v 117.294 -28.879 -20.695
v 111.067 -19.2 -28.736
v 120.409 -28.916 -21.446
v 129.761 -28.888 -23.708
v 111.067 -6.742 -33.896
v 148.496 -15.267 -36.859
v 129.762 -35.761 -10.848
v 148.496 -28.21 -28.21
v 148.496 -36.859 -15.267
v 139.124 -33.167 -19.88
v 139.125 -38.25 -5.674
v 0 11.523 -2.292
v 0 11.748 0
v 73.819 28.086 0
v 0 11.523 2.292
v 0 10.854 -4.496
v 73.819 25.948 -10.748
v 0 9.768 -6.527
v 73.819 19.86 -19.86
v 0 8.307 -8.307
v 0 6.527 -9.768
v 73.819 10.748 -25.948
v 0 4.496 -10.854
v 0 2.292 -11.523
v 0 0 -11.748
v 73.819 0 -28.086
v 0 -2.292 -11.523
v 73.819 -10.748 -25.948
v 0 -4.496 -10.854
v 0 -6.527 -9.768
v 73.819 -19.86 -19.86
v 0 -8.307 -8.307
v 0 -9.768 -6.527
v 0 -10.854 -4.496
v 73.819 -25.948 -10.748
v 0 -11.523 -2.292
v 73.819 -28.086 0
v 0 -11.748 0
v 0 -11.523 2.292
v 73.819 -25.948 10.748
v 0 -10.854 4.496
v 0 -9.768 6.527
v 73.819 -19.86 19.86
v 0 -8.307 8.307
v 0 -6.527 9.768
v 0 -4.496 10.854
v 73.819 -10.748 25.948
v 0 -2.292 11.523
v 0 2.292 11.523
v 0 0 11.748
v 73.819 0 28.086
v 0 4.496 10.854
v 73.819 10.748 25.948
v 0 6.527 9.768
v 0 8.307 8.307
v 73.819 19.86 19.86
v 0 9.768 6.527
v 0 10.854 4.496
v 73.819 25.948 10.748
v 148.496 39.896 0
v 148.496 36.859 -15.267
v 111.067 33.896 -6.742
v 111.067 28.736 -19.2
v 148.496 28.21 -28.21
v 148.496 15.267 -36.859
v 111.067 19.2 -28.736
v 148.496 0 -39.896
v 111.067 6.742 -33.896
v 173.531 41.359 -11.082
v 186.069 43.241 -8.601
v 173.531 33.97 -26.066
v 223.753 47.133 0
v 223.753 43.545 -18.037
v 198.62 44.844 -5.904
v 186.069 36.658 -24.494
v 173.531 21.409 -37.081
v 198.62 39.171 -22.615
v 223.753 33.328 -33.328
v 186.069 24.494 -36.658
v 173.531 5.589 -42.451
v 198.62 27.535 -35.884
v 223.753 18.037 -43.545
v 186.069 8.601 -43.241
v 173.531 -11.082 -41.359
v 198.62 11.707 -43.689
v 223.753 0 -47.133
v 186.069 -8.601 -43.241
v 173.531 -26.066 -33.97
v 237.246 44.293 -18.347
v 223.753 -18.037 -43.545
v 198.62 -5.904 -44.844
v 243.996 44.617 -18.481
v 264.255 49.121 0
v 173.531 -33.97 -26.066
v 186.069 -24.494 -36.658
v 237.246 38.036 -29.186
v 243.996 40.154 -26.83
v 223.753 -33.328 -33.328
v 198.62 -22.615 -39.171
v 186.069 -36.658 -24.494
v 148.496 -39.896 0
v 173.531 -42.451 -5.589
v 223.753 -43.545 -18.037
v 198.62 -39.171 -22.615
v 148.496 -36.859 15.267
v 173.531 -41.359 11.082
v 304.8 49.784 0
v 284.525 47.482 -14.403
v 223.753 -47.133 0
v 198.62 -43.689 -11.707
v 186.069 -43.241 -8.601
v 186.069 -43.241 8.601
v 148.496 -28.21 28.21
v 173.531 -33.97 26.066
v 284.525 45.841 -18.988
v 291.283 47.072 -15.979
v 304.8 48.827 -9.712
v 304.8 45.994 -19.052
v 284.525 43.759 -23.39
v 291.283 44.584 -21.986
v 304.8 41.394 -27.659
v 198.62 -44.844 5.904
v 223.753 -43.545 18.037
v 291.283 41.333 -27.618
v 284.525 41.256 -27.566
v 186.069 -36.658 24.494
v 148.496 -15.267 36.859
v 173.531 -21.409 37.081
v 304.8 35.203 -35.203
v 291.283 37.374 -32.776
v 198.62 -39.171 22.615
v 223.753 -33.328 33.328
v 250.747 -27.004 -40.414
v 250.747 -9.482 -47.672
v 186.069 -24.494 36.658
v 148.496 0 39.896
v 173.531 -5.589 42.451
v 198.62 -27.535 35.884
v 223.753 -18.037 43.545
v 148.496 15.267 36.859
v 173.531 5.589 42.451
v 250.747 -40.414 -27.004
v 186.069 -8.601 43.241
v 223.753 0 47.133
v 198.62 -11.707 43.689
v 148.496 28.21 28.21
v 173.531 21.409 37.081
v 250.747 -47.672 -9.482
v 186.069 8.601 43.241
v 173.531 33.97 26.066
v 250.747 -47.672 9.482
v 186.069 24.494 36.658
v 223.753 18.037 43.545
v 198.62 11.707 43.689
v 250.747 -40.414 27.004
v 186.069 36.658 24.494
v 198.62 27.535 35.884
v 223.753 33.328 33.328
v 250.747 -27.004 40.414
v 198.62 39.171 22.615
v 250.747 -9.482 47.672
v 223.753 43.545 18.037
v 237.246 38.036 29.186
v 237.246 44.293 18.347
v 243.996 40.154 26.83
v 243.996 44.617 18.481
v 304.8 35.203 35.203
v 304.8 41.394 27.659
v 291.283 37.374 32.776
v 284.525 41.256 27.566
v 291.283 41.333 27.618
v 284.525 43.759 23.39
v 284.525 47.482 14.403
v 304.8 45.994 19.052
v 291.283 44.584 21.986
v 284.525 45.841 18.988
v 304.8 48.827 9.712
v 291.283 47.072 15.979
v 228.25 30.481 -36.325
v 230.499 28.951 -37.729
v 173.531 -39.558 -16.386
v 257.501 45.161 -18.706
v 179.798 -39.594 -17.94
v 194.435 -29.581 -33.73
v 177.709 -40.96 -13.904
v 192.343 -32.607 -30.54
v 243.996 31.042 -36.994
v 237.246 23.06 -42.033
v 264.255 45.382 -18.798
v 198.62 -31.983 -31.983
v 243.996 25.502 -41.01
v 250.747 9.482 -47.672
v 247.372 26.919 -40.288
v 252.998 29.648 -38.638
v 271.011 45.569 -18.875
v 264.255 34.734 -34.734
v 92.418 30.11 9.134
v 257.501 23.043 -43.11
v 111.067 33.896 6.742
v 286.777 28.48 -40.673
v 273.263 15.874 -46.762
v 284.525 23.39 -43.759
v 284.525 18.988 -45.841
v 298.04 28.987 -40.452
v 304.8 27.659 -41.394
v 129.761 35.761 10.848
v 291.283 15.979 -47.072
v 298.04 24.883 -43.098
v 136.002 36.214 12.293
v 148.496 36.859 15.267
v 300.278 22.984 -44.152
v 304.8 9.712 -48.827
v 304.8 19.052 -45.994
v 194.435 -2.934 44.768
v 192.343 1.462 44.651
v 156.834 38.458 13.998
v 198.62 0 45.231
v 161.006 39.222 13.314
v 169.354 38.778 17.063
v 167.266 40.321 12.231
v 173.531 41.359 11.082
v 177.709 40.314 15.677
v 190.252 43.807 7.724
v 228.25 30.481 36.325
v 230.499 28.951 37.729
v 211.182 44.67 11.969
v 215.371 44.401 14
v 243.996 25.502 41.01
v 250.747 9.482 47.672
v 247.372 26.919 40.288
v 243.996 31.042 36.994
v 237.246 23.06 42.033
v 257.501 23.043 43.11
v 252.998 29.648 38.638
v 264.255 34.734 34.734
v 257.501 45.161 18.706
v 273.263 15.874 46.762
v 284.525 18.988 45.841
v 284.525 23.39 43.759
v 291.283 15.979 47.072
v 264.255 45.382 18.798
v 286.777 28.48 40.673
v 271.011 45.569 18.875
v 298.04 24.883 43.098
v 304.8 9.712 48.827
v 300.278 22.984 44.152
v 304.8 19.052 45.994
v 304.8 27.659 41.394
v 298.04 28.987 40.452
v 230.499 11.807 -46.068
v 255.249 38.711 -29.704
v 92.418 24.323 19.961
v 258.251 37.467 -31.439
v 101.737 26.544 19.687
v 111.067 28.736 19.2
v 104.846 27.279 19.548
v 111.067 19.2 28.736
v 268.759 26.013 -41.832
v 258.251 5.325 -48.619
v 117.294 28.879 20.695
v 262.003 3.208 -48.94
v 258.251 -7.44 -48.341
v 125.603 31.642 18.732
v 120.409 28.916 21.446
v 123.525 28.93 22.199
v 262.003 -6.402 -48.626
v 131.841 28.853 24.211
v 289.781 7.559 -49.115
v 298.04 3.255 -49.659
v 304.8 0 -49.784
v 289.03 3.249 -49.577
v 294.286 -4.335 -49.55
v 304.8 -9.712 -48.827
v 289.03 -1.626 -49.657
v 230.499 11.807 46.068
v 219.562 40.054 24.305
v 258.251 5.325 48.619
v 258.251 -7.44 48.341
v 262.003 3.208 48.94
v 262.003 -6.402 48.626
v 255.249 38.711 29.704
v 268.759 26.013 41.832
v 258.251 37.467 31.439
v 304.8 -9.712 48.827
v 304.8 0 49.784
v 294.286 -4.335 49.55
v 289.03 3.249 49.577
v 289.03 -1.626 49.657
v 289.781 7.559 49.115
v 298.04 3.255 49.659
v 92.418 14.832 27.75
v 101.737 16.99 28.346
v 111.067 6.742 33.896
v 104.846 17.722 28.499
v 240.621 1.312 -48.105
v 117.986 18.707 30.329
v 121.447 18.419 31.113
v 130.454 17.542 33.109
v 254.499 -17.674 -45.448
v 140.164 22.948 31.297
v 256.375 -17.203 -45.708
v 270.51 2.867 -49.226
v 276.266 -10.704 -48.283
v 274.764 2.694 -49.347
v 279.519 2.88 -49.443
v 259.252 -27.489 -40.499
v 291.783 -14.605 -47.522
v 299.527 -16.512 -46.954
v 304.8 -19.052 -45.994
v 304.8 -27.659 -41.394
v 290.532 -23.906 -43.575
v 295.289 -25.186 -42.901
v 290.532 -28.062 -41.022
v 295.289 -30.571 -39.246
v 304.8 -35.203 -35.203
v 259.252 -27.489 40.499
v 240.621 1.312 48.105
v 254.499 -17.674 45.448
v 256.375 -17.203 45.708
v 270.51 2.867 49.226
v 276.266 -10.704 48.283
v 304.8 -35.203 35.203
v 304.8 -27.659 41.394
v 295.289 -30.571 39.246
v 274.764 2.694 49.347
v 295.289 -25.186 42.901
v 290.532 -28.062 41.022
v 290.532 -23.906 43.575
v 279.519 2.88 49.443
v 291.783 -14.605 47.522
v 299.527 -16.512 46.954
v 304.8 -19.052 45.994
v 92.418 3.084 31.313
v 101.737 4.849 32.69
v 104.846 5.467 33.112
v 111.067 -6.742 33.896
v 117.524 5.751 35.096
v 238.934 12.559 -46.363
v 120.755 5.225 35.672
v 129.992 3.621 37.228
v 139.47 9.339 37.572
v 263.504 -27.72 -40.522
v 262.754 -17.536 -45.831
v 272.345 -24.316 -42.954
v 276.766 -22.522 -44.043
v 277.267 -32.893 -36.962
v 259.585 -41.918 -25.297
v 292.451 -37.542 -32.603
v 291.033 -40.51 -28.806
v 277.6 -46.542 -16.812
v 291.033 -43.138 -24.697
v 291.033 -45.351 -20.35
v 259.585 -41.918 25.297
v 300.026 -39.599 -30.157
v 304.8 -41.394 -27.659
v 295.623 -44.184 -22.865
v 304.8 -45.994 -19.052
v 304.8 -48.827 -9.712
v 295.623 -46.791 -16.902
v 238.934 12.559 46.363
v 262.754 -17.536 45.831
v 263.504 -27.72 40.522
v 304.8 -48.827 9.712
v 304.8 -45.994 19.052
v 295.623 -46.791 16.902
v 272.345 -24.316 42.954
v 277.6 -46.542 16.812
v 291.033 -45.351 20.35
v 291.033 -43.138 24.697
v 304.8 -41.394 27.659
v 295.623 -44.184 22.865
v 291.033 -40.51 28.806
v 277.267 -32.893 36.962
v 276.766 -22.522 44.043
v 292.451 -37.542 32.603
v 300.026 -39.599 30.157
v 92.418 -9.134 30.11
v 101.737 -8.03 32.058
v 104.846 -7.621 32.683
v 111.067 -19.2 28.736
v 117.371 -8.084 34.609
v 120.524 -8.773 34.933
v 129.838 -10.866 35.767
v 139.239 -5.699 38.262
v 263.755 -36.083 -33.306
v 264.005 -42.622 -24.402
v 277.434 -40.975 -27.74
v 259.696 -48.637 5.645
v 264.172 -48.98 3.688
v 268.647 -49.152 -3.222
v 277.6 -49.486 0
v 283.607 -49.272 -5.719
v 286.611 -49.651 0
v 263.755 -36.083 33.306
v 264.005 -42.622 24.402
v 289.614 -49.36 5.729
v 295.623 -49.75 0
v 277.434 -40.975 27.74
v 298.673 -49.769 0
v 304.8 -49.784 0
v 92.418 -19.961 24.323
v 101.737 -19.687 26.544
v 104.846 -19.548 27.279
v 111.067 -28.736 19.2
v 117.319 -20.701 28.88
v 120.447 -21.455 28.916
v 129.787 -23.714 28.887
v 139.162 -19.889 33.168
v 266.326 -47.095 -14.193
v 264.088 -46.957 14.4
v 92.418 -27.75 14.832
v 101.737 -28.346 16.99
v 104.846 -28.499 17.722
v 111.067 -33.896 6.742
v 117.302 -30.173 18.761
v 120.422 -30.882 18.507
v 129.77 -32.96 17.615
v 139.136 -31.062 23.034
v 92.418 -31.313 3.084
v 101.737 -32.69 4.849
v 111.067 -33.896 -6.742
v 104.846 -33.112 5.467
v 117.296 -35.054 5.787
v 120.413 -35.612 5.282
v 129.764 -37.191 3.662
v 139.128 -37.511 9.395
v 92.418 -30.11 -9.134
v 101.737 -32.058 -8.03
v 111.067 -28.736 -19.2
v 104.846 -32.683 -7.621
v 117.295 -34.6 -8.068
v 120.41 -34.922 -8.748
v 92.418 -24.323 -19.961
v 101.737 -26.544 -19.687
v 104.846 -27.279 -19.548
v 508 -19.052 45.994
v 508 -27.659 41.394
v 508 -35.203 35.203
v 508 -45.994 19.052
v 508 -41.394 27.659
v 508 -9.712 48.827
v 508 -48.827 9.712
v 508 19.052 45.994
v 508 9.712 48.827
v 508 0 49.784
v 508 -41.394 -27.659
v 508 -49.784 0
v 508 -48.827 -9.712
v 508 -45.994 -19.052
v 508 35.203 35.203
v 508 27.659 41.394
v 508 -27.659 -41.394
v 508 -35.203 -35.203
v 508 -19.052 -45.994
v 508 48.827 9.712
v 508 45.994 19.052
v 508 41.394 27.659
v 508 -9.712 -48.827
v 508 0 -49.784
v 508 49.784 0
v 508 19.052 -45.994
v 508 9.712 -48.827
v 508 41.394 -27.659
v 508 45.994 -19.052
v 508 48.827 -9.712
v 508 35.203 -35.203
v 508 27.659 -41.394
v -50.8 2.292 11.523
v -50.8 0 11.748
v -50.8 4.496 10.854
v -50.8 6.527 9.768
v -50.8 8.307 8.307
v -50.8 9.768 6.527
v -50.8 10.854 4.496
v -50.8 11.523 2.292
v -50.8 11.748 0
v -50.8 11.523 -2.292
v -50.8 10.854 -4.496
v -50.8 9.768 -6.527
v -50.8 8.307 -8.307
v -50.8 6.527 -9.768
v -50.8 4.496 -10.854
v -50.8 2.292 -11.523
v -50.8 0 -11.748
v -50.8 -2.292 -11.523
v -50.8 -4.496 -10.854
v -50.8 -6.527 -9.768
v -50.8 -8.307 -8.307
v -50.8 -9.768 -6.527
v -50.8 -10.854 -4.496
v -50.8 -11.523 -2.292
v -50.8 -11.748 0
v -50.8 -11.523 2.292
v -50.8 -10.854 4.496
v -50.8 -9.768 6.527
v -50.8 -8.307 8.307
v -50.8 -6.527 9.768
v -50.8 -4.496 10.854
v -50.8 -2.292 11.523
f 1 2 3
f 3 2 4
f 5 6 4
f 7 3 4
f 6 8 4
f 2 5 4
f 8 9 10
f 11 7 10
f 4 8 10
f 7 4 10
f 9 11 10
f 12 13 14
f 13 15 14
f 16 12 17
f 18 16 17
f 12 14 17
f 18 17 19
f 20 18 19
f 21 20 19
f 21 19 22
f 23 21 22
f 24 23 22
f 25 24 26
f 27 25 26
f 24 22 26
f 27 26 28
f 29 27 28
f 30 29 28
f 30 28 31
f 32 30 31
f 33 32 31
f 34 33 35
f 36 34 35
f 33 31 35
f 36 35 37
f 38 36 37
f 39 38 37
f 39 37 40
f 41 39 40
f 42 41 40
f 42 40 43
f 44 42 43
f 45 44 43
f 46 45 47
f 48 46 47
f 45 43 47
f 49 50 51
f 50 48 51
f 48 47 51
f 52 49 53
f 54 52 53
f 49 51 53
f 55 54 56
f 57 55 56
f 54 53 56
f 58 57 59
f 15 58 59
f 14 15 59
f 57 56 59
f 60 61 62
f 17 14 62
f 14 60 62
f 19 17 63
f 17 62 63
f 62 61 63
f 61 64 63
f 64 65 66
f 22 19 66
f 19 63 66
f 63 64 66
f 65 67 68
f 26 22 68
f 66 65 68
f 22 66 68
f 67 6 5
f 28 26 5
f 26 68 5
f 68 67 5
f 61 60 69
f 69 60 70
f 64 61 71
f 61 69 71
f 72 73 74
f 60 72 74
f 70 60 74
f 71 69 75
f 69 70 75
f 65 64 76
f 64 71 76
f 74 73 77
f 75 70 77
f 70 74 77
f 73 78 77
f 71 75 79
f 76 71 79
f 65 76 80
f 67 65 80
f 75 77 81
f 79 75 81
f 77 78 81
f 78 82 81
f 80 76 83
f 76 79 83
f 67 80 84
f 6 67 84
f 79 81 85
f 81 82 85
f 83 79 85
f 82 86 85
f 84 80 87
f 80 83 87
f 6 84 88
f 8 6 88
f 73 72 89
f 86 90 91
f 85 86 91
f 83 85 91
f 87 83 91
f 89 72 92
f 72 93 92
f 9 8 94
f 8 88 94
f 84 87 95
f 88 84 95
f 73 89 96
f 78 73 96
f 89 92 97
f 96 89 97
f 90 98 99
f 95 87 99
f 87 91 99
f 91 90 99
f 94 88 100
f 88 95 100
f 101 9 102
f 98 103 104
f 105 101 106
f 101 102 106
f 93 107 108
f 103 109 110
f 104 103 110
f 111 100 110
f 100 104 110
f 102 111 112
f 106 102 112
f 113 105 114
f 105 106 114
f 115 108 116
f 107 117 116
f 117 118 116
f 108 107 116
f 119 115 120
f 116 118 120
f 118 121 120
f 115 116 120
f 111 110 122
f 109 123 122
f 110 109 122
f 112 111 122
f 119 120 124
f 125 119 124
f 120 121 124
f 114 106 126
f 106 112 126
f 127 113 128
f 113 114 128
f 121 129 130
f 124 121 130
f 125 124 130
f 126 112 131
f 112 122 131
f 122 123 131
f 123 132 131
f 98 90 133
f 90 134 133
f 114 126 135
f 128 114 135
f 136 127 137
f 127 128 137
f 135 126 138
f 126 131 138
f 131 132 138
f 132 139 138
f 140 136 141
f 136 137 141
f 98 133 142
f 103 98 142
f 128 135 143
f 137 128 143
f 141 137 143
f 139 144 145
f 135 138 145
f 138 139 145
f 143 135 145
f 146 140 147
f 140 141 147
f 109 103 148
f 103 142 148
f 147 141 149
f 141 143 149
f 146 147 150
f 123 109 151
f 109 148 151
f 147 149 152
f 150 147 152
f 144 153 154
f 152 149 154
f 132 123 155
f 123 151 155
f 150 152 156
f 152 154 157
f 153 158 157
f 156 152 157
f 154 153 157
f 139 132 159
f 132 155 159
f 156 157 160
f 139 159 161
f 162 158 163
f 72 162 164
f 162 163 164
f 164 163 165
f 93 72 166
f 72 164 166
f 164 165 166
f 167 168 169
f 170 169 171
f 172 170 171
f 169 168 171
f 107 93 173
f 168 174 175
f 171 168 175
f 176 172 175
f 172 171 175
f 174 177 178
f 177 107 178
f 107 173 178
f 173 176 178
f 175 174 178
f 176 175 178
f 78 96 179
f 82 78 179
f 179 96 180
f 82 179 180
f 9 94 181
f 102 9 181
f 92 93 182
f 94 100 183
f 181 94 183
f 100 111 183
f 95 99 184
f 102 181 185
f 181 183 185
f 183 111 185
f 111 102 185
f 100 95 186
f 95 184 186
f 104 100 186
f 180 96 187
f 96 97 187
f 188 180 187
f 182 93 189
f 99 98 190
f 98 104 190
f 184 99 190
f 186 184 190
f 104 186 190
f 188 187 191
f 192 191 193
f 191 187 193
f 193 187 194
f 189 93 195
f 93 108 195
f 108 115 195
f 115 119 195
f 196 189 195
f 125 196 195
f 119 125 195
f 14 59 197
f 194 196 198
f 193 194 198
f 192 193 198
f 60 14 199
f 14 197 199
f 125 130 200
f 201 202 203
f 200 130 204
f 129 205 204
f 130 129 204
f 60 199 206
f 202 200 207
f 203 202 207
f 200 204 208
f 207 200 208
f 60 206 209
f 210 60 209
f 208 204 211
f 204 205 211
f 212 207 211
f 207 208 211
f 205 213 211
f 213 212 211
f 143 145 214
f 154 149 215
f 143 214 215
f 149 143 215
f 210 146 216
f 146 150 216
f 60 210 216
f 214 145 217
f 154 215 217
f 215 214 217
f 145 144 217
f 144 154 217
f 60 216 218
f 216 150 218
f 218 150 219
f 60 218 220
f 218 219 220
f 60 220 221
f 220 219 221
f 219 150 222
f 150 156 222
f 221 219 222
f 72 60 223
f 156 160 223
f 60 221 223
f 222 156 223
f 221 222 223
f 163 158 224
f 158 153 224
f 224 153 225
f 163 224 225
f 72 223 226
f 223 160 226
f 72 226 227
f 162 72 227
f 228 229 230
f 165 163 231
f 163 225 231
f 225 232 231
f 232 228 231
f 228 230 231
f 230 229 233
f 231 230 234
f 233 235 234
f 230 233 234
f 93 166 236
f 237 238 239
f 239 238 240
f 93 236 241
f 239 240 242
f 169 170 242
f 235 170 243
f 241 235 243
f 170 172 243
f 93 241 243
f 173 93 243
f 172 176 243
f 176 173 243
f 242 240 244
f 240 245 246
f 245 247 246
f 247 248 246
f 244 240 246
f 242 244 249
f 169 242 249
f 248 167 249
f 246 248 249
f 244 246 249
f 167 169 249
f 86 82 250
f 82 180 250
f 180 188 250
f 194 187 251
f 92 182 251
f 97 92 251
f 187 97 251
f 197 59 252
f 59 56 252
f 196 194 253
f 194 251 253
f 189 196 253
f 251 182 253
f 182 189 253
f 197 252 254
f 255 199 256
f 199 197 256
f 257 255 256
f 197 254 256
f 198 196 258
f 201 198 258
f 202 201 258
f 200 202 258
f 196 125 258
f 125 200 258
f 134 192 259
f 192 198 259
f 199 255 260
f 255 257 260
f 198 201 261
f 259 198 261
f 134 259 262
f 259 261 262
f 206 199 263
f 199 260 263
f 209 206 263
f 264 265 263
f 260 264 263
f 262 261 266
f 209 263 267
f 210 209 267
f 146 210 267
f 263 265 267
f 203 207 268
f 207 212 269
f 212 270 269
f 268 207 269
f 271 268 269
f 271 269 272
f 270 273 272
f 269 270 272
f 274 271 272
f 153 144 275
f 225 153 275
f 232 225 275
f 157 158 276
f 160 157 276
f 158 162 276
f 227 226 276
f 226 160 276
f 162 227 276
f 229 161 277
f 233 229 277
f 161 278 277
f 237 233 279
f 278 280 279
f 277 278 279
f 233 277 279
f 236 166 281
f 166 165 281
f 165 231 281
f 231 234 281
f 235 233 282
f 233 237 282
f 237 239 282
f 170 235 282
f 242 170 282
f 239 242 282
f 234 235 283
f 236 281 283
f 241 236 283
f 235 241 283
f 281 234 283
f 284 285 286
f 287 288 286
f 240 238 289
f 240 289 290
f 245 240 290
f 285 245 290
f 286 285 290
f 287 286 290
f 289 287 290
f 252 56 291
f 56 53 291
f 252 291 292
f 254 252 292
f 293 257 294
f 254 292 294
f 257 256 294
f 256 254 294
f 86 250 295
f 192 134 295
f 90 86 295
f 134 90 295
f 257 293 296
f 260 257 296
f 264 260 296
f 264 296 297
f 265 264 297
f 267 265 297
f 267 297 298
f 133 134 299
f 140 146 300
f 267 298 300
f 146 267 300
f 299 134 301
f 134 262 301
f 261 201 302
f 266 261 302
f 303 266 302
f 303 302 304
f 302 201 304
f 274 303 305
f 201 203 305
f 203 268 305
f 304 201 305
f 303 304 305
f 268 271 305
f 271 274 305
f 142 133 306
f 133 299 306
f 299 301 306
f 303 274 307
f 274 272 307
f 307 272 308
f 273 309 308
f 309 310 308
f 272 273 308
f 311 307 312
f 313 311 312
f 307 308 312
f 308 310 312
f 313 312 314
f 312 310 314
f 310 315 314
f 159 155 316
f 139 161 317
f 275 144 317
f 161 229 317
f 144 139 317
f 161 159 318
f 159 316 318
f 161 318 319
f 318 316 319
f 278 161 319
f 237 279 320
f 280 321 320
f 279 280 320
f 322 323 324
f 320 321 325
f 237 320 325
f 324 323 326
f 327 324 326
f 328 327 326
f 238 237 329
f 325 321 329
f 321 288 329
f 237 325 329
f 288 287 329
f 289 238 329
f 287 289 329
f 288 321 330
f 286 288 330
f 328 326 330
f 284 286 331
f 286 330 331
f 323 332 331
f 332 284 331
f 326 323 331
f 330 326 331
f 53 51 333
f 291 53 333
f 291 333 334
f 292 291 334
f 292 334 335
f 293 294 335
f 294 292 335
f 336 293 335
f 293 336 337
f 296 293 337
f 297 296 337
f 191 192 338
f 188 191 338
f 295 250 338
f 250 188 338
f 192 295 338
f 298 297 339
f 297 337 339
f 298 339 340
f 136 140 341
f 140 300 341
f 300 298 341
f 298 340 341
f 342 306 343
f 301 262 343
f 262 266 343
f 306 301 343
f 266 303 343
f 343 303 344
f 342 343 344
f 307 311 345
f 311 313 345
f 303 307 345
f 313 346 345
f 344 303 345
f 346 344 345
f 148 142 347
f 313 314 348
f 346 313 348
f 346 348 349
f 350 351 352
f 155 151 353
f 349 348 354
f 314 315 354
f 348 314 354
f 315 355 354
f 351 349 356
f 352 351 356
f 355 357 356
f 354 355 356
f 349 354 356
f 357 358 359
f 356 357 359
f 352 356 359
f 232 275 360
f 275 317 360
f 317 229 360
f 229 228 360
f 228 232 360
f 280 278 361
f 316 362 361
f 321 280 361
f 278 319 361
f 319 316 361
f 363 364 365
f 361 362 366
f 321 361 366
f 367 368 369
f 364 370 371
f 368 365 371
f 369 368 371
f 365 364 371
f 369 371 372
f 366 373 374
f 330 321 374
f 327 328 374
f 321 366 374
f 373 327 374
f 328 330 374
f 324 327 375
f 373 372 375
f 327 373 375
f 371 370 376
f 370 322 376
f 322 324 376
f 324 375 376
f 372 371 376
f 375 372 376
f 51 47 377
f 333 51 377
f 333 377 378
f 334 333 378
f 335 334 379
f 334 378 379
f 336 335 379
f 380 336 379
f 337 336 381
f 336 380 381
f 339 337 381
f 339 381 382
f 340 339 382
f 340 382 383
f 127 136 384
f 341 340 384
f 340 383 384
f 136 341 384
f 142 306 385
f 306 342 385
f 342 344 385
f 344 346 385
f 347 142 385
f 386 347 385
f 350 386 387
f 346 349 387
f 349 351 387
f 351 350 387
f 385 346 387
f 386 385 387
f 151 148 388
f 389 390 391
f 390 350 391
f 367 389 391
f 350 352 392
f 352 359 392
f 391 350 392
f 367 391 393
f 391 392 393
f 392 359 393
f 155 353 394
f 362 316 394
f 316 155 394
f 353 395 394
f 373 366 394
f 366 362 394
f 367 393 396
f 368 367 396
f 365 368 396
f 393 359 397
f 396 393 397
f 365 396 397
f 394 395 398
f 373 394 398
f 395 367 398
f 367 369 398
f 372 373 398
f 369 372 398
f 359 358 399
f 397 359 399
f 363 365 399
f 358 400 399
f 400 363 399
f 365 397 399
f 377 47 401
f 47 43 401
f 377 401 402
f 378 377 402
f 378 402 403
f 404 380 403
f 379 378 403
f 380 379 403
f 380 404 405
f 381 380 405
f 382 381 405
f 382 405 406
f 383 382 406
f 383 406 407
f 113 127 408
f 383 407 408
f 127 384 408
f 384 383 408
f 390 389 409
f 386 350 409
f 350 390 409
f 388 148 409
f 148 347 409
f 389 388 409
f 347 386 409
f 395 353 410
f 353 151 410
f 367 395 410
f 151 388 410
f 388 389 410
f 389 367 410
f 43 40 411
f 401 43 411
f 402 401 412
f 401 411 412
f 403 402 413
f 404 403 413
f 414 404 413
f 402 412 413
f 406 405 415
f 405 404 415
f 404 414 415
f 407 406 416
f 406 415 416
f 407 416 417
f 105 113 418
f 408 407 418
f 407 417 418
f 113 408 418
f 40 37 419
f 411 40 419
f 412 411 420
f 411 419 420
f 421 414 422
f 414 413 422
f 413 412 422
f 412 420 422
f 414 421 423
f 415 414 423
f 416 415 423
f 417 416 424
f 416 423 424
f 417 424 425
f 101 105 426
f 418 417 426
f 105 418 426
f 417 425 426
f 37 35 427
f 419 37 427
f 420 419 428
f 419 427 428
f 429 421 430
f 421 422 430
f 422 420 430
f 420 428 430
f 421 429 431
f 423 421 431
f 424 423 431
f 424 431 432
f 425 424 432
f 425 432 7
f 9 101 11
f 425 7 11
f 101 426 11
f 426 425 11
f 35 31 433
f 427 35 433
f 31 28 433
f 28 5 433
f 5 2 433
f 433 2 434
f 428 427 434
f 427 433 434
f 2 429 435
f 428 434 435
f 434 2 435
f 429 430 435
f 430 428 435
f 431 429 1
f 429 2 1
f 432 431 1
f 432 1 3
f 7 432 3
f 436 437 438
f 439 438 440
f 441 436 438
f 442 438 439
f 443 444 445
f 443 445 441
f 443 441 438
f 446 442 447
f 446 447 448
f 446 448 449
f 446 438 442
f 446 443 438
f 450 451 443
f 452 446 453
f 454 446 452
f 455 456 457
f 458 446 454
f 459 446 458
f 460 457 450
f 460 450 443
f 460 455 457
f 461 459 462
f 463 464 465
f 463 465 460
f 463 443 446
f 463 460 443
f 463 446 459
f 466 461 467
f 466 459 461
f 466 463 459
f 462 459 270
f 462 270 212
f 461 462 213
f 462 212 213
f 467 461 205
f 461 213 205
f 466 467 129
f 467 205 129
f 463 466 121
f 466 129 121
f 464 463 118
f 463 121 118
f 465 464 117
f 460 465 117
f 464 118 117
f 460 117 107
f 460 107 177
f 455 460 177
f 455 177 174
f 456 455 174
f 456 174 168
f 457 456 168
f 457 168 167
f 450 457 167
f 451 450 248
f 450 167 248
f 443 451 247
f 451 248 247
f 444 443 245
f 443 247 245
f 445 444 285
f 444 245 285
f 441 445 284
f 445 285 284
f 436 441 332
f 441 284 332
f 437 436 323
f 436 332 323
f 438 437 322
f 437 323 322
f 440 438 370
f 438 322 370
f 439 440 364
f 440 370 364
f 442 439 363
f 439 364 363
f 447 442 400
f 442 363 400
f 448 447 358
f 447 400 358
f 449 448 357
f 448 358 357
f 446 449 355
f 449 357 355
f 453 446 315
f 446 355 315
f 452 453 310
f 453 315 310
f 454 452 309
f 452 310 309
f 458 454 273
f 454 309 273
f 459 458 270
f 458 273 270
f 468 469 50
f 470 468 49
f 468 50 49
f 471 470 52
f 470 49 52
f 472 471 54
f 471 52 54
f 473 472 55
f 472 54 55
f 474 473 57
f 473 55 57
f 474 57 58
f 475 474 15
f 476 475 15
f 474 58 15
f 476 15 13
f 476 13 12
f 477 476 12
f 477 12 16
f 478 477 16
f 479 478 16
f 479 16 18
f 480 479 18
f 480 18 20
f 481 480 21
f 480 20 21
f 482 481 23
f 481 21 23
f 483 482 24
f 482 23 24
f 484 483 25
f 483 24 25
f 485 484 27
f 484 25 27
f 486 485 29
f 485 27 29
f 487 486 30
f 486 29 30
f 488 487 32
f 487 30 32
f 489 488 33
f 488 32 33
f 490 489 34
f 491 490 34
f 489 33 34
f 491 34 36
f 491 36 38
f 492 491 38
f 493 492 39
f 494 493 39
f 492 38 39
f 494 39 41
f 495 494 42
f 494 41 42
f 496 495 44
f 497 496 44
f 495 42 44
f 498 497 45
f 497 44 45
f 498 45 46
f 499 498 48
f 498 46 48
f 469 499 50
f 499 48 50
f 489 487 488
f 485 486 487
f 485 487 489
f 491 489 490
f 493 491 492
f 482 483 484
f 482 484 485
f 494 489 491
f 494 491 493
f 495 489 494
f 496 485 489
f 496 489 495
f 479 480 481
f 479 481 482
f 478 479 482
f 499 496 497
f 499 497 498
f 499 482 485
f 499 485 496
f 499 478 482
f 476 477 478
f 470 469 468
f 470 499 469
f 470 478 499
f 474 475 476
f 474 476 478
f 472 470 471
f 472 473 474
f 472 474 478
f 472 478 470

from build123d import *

# Parameters (mm, degrees)
SKETCH2_R           = 49.784
BOSS_EXTRUDE1_DEPTH = 203.2
SKETCH3_R           = 11.74839717
BOSS_EXTRUDE2_DEPTH = 50.8


with BuildPart() as part:
    # Sketch1 → Revolve1 (revolve)
    with BuildSketch(Plane.XY):
        with BuildLine():
            Line((304.8, 49.784), (304.8, 0))
            Line((304.8, 0), (0, 0))
            Line((0, 0), (0, 11.748397173))
            add(Edge.make_bspline(
                [(0, 11.748397173), (0.424160675, 11.855932678), (1.277768006, 12.07173392), (3.085410505, 12.527272667), (5.106222596, 13.032281093), (7.110128552, 13.529344024), (9.159948224, 14.034387922), (11.195444228, 14.532141119), (13.233412884, 15.026861964), (15.805049223, 15.64653599), (18.91026091, 16.387291474), (22.550652523, 17.244690048), (26.727238439, 18.213147263), (31.952168035, 19.405675489), (42.412897925, 21.742539102), (62.333903875, 25.976370199), (110.770450737, 35.225121195), (160.70732909, 42.159920913), (207.702302928, 46.434962608), (245.168015054, 48.368183749), (253.734807707, 48.740972714), (260.161369668, 48.98354131), (264.446272339, 49.130442523), (268.731666265, 49.262530797), (273.017475857, 49.379804553), (277.303691578, 49.48226239), (281.590188304, 49.569903083), (285.329649653, 49.633426545), (288.521672796, 49.67849525), (291.166731437, 49.70980578), (293.263778354, 49.731088433), (295.359186858, 49.74882407), (297.470177021, 49.76301264), (299.535126271, 49.773654103), (301.617177871, 49.780748429), (303.482211221, 49.783408805), (304.362420109, 49.784), (304.8, 49.784)],
                knots=[0.082917815, 0.082917815, 0.082917815, 0.082917815, 0.082917815, 0.088601511, 0.094285207, 0.099968902, 0.105652598, 0.111336294, 0.11701999, 0.122703686, 0.128387381, 0.140005218, 0.151623054, 0.16324089, 0.174858727, 0.198094396, 0.267801409, 0.383979763, 0.709279153, 0.744132659, 0.778986165, 0.790604, 0.802221836, 0.813839671, 0.825457507, 0.837075342, 0.848693177, 0.860311013, 0.871928848, 0.877612544, 0.883296239, 0.888979935, 0.89466363, 0.900347326, 0.906031021, 0.911714717, 0.917398412, 0.917398412, 0.917398412, 0.917398412, 0.917398412], degree=4))
        make_face()
    revolve(axis=Axis((304.8, 0, 0), (-1, 0, 0)))

    # Sketch2 → Boss-Extrude1 (add)
    with BuildSketch(Plane(origin=(304.8, 0, 0), x_dir=(0, 0, -1), z_dir=(1, 0, 0))):
        Circle(SKETCH2_R)
    extrude(amount=BOSS_EXTRUDE1_DEPTH)

    # Sketch3 → Boss-Extrude2 (add)
    with BuildSketch(Plane.ZY):
        Circle(SKETCH3_R)
    extrude(amount=BOSS_EXTRUDE2_DEPTH)


solid = part.part
